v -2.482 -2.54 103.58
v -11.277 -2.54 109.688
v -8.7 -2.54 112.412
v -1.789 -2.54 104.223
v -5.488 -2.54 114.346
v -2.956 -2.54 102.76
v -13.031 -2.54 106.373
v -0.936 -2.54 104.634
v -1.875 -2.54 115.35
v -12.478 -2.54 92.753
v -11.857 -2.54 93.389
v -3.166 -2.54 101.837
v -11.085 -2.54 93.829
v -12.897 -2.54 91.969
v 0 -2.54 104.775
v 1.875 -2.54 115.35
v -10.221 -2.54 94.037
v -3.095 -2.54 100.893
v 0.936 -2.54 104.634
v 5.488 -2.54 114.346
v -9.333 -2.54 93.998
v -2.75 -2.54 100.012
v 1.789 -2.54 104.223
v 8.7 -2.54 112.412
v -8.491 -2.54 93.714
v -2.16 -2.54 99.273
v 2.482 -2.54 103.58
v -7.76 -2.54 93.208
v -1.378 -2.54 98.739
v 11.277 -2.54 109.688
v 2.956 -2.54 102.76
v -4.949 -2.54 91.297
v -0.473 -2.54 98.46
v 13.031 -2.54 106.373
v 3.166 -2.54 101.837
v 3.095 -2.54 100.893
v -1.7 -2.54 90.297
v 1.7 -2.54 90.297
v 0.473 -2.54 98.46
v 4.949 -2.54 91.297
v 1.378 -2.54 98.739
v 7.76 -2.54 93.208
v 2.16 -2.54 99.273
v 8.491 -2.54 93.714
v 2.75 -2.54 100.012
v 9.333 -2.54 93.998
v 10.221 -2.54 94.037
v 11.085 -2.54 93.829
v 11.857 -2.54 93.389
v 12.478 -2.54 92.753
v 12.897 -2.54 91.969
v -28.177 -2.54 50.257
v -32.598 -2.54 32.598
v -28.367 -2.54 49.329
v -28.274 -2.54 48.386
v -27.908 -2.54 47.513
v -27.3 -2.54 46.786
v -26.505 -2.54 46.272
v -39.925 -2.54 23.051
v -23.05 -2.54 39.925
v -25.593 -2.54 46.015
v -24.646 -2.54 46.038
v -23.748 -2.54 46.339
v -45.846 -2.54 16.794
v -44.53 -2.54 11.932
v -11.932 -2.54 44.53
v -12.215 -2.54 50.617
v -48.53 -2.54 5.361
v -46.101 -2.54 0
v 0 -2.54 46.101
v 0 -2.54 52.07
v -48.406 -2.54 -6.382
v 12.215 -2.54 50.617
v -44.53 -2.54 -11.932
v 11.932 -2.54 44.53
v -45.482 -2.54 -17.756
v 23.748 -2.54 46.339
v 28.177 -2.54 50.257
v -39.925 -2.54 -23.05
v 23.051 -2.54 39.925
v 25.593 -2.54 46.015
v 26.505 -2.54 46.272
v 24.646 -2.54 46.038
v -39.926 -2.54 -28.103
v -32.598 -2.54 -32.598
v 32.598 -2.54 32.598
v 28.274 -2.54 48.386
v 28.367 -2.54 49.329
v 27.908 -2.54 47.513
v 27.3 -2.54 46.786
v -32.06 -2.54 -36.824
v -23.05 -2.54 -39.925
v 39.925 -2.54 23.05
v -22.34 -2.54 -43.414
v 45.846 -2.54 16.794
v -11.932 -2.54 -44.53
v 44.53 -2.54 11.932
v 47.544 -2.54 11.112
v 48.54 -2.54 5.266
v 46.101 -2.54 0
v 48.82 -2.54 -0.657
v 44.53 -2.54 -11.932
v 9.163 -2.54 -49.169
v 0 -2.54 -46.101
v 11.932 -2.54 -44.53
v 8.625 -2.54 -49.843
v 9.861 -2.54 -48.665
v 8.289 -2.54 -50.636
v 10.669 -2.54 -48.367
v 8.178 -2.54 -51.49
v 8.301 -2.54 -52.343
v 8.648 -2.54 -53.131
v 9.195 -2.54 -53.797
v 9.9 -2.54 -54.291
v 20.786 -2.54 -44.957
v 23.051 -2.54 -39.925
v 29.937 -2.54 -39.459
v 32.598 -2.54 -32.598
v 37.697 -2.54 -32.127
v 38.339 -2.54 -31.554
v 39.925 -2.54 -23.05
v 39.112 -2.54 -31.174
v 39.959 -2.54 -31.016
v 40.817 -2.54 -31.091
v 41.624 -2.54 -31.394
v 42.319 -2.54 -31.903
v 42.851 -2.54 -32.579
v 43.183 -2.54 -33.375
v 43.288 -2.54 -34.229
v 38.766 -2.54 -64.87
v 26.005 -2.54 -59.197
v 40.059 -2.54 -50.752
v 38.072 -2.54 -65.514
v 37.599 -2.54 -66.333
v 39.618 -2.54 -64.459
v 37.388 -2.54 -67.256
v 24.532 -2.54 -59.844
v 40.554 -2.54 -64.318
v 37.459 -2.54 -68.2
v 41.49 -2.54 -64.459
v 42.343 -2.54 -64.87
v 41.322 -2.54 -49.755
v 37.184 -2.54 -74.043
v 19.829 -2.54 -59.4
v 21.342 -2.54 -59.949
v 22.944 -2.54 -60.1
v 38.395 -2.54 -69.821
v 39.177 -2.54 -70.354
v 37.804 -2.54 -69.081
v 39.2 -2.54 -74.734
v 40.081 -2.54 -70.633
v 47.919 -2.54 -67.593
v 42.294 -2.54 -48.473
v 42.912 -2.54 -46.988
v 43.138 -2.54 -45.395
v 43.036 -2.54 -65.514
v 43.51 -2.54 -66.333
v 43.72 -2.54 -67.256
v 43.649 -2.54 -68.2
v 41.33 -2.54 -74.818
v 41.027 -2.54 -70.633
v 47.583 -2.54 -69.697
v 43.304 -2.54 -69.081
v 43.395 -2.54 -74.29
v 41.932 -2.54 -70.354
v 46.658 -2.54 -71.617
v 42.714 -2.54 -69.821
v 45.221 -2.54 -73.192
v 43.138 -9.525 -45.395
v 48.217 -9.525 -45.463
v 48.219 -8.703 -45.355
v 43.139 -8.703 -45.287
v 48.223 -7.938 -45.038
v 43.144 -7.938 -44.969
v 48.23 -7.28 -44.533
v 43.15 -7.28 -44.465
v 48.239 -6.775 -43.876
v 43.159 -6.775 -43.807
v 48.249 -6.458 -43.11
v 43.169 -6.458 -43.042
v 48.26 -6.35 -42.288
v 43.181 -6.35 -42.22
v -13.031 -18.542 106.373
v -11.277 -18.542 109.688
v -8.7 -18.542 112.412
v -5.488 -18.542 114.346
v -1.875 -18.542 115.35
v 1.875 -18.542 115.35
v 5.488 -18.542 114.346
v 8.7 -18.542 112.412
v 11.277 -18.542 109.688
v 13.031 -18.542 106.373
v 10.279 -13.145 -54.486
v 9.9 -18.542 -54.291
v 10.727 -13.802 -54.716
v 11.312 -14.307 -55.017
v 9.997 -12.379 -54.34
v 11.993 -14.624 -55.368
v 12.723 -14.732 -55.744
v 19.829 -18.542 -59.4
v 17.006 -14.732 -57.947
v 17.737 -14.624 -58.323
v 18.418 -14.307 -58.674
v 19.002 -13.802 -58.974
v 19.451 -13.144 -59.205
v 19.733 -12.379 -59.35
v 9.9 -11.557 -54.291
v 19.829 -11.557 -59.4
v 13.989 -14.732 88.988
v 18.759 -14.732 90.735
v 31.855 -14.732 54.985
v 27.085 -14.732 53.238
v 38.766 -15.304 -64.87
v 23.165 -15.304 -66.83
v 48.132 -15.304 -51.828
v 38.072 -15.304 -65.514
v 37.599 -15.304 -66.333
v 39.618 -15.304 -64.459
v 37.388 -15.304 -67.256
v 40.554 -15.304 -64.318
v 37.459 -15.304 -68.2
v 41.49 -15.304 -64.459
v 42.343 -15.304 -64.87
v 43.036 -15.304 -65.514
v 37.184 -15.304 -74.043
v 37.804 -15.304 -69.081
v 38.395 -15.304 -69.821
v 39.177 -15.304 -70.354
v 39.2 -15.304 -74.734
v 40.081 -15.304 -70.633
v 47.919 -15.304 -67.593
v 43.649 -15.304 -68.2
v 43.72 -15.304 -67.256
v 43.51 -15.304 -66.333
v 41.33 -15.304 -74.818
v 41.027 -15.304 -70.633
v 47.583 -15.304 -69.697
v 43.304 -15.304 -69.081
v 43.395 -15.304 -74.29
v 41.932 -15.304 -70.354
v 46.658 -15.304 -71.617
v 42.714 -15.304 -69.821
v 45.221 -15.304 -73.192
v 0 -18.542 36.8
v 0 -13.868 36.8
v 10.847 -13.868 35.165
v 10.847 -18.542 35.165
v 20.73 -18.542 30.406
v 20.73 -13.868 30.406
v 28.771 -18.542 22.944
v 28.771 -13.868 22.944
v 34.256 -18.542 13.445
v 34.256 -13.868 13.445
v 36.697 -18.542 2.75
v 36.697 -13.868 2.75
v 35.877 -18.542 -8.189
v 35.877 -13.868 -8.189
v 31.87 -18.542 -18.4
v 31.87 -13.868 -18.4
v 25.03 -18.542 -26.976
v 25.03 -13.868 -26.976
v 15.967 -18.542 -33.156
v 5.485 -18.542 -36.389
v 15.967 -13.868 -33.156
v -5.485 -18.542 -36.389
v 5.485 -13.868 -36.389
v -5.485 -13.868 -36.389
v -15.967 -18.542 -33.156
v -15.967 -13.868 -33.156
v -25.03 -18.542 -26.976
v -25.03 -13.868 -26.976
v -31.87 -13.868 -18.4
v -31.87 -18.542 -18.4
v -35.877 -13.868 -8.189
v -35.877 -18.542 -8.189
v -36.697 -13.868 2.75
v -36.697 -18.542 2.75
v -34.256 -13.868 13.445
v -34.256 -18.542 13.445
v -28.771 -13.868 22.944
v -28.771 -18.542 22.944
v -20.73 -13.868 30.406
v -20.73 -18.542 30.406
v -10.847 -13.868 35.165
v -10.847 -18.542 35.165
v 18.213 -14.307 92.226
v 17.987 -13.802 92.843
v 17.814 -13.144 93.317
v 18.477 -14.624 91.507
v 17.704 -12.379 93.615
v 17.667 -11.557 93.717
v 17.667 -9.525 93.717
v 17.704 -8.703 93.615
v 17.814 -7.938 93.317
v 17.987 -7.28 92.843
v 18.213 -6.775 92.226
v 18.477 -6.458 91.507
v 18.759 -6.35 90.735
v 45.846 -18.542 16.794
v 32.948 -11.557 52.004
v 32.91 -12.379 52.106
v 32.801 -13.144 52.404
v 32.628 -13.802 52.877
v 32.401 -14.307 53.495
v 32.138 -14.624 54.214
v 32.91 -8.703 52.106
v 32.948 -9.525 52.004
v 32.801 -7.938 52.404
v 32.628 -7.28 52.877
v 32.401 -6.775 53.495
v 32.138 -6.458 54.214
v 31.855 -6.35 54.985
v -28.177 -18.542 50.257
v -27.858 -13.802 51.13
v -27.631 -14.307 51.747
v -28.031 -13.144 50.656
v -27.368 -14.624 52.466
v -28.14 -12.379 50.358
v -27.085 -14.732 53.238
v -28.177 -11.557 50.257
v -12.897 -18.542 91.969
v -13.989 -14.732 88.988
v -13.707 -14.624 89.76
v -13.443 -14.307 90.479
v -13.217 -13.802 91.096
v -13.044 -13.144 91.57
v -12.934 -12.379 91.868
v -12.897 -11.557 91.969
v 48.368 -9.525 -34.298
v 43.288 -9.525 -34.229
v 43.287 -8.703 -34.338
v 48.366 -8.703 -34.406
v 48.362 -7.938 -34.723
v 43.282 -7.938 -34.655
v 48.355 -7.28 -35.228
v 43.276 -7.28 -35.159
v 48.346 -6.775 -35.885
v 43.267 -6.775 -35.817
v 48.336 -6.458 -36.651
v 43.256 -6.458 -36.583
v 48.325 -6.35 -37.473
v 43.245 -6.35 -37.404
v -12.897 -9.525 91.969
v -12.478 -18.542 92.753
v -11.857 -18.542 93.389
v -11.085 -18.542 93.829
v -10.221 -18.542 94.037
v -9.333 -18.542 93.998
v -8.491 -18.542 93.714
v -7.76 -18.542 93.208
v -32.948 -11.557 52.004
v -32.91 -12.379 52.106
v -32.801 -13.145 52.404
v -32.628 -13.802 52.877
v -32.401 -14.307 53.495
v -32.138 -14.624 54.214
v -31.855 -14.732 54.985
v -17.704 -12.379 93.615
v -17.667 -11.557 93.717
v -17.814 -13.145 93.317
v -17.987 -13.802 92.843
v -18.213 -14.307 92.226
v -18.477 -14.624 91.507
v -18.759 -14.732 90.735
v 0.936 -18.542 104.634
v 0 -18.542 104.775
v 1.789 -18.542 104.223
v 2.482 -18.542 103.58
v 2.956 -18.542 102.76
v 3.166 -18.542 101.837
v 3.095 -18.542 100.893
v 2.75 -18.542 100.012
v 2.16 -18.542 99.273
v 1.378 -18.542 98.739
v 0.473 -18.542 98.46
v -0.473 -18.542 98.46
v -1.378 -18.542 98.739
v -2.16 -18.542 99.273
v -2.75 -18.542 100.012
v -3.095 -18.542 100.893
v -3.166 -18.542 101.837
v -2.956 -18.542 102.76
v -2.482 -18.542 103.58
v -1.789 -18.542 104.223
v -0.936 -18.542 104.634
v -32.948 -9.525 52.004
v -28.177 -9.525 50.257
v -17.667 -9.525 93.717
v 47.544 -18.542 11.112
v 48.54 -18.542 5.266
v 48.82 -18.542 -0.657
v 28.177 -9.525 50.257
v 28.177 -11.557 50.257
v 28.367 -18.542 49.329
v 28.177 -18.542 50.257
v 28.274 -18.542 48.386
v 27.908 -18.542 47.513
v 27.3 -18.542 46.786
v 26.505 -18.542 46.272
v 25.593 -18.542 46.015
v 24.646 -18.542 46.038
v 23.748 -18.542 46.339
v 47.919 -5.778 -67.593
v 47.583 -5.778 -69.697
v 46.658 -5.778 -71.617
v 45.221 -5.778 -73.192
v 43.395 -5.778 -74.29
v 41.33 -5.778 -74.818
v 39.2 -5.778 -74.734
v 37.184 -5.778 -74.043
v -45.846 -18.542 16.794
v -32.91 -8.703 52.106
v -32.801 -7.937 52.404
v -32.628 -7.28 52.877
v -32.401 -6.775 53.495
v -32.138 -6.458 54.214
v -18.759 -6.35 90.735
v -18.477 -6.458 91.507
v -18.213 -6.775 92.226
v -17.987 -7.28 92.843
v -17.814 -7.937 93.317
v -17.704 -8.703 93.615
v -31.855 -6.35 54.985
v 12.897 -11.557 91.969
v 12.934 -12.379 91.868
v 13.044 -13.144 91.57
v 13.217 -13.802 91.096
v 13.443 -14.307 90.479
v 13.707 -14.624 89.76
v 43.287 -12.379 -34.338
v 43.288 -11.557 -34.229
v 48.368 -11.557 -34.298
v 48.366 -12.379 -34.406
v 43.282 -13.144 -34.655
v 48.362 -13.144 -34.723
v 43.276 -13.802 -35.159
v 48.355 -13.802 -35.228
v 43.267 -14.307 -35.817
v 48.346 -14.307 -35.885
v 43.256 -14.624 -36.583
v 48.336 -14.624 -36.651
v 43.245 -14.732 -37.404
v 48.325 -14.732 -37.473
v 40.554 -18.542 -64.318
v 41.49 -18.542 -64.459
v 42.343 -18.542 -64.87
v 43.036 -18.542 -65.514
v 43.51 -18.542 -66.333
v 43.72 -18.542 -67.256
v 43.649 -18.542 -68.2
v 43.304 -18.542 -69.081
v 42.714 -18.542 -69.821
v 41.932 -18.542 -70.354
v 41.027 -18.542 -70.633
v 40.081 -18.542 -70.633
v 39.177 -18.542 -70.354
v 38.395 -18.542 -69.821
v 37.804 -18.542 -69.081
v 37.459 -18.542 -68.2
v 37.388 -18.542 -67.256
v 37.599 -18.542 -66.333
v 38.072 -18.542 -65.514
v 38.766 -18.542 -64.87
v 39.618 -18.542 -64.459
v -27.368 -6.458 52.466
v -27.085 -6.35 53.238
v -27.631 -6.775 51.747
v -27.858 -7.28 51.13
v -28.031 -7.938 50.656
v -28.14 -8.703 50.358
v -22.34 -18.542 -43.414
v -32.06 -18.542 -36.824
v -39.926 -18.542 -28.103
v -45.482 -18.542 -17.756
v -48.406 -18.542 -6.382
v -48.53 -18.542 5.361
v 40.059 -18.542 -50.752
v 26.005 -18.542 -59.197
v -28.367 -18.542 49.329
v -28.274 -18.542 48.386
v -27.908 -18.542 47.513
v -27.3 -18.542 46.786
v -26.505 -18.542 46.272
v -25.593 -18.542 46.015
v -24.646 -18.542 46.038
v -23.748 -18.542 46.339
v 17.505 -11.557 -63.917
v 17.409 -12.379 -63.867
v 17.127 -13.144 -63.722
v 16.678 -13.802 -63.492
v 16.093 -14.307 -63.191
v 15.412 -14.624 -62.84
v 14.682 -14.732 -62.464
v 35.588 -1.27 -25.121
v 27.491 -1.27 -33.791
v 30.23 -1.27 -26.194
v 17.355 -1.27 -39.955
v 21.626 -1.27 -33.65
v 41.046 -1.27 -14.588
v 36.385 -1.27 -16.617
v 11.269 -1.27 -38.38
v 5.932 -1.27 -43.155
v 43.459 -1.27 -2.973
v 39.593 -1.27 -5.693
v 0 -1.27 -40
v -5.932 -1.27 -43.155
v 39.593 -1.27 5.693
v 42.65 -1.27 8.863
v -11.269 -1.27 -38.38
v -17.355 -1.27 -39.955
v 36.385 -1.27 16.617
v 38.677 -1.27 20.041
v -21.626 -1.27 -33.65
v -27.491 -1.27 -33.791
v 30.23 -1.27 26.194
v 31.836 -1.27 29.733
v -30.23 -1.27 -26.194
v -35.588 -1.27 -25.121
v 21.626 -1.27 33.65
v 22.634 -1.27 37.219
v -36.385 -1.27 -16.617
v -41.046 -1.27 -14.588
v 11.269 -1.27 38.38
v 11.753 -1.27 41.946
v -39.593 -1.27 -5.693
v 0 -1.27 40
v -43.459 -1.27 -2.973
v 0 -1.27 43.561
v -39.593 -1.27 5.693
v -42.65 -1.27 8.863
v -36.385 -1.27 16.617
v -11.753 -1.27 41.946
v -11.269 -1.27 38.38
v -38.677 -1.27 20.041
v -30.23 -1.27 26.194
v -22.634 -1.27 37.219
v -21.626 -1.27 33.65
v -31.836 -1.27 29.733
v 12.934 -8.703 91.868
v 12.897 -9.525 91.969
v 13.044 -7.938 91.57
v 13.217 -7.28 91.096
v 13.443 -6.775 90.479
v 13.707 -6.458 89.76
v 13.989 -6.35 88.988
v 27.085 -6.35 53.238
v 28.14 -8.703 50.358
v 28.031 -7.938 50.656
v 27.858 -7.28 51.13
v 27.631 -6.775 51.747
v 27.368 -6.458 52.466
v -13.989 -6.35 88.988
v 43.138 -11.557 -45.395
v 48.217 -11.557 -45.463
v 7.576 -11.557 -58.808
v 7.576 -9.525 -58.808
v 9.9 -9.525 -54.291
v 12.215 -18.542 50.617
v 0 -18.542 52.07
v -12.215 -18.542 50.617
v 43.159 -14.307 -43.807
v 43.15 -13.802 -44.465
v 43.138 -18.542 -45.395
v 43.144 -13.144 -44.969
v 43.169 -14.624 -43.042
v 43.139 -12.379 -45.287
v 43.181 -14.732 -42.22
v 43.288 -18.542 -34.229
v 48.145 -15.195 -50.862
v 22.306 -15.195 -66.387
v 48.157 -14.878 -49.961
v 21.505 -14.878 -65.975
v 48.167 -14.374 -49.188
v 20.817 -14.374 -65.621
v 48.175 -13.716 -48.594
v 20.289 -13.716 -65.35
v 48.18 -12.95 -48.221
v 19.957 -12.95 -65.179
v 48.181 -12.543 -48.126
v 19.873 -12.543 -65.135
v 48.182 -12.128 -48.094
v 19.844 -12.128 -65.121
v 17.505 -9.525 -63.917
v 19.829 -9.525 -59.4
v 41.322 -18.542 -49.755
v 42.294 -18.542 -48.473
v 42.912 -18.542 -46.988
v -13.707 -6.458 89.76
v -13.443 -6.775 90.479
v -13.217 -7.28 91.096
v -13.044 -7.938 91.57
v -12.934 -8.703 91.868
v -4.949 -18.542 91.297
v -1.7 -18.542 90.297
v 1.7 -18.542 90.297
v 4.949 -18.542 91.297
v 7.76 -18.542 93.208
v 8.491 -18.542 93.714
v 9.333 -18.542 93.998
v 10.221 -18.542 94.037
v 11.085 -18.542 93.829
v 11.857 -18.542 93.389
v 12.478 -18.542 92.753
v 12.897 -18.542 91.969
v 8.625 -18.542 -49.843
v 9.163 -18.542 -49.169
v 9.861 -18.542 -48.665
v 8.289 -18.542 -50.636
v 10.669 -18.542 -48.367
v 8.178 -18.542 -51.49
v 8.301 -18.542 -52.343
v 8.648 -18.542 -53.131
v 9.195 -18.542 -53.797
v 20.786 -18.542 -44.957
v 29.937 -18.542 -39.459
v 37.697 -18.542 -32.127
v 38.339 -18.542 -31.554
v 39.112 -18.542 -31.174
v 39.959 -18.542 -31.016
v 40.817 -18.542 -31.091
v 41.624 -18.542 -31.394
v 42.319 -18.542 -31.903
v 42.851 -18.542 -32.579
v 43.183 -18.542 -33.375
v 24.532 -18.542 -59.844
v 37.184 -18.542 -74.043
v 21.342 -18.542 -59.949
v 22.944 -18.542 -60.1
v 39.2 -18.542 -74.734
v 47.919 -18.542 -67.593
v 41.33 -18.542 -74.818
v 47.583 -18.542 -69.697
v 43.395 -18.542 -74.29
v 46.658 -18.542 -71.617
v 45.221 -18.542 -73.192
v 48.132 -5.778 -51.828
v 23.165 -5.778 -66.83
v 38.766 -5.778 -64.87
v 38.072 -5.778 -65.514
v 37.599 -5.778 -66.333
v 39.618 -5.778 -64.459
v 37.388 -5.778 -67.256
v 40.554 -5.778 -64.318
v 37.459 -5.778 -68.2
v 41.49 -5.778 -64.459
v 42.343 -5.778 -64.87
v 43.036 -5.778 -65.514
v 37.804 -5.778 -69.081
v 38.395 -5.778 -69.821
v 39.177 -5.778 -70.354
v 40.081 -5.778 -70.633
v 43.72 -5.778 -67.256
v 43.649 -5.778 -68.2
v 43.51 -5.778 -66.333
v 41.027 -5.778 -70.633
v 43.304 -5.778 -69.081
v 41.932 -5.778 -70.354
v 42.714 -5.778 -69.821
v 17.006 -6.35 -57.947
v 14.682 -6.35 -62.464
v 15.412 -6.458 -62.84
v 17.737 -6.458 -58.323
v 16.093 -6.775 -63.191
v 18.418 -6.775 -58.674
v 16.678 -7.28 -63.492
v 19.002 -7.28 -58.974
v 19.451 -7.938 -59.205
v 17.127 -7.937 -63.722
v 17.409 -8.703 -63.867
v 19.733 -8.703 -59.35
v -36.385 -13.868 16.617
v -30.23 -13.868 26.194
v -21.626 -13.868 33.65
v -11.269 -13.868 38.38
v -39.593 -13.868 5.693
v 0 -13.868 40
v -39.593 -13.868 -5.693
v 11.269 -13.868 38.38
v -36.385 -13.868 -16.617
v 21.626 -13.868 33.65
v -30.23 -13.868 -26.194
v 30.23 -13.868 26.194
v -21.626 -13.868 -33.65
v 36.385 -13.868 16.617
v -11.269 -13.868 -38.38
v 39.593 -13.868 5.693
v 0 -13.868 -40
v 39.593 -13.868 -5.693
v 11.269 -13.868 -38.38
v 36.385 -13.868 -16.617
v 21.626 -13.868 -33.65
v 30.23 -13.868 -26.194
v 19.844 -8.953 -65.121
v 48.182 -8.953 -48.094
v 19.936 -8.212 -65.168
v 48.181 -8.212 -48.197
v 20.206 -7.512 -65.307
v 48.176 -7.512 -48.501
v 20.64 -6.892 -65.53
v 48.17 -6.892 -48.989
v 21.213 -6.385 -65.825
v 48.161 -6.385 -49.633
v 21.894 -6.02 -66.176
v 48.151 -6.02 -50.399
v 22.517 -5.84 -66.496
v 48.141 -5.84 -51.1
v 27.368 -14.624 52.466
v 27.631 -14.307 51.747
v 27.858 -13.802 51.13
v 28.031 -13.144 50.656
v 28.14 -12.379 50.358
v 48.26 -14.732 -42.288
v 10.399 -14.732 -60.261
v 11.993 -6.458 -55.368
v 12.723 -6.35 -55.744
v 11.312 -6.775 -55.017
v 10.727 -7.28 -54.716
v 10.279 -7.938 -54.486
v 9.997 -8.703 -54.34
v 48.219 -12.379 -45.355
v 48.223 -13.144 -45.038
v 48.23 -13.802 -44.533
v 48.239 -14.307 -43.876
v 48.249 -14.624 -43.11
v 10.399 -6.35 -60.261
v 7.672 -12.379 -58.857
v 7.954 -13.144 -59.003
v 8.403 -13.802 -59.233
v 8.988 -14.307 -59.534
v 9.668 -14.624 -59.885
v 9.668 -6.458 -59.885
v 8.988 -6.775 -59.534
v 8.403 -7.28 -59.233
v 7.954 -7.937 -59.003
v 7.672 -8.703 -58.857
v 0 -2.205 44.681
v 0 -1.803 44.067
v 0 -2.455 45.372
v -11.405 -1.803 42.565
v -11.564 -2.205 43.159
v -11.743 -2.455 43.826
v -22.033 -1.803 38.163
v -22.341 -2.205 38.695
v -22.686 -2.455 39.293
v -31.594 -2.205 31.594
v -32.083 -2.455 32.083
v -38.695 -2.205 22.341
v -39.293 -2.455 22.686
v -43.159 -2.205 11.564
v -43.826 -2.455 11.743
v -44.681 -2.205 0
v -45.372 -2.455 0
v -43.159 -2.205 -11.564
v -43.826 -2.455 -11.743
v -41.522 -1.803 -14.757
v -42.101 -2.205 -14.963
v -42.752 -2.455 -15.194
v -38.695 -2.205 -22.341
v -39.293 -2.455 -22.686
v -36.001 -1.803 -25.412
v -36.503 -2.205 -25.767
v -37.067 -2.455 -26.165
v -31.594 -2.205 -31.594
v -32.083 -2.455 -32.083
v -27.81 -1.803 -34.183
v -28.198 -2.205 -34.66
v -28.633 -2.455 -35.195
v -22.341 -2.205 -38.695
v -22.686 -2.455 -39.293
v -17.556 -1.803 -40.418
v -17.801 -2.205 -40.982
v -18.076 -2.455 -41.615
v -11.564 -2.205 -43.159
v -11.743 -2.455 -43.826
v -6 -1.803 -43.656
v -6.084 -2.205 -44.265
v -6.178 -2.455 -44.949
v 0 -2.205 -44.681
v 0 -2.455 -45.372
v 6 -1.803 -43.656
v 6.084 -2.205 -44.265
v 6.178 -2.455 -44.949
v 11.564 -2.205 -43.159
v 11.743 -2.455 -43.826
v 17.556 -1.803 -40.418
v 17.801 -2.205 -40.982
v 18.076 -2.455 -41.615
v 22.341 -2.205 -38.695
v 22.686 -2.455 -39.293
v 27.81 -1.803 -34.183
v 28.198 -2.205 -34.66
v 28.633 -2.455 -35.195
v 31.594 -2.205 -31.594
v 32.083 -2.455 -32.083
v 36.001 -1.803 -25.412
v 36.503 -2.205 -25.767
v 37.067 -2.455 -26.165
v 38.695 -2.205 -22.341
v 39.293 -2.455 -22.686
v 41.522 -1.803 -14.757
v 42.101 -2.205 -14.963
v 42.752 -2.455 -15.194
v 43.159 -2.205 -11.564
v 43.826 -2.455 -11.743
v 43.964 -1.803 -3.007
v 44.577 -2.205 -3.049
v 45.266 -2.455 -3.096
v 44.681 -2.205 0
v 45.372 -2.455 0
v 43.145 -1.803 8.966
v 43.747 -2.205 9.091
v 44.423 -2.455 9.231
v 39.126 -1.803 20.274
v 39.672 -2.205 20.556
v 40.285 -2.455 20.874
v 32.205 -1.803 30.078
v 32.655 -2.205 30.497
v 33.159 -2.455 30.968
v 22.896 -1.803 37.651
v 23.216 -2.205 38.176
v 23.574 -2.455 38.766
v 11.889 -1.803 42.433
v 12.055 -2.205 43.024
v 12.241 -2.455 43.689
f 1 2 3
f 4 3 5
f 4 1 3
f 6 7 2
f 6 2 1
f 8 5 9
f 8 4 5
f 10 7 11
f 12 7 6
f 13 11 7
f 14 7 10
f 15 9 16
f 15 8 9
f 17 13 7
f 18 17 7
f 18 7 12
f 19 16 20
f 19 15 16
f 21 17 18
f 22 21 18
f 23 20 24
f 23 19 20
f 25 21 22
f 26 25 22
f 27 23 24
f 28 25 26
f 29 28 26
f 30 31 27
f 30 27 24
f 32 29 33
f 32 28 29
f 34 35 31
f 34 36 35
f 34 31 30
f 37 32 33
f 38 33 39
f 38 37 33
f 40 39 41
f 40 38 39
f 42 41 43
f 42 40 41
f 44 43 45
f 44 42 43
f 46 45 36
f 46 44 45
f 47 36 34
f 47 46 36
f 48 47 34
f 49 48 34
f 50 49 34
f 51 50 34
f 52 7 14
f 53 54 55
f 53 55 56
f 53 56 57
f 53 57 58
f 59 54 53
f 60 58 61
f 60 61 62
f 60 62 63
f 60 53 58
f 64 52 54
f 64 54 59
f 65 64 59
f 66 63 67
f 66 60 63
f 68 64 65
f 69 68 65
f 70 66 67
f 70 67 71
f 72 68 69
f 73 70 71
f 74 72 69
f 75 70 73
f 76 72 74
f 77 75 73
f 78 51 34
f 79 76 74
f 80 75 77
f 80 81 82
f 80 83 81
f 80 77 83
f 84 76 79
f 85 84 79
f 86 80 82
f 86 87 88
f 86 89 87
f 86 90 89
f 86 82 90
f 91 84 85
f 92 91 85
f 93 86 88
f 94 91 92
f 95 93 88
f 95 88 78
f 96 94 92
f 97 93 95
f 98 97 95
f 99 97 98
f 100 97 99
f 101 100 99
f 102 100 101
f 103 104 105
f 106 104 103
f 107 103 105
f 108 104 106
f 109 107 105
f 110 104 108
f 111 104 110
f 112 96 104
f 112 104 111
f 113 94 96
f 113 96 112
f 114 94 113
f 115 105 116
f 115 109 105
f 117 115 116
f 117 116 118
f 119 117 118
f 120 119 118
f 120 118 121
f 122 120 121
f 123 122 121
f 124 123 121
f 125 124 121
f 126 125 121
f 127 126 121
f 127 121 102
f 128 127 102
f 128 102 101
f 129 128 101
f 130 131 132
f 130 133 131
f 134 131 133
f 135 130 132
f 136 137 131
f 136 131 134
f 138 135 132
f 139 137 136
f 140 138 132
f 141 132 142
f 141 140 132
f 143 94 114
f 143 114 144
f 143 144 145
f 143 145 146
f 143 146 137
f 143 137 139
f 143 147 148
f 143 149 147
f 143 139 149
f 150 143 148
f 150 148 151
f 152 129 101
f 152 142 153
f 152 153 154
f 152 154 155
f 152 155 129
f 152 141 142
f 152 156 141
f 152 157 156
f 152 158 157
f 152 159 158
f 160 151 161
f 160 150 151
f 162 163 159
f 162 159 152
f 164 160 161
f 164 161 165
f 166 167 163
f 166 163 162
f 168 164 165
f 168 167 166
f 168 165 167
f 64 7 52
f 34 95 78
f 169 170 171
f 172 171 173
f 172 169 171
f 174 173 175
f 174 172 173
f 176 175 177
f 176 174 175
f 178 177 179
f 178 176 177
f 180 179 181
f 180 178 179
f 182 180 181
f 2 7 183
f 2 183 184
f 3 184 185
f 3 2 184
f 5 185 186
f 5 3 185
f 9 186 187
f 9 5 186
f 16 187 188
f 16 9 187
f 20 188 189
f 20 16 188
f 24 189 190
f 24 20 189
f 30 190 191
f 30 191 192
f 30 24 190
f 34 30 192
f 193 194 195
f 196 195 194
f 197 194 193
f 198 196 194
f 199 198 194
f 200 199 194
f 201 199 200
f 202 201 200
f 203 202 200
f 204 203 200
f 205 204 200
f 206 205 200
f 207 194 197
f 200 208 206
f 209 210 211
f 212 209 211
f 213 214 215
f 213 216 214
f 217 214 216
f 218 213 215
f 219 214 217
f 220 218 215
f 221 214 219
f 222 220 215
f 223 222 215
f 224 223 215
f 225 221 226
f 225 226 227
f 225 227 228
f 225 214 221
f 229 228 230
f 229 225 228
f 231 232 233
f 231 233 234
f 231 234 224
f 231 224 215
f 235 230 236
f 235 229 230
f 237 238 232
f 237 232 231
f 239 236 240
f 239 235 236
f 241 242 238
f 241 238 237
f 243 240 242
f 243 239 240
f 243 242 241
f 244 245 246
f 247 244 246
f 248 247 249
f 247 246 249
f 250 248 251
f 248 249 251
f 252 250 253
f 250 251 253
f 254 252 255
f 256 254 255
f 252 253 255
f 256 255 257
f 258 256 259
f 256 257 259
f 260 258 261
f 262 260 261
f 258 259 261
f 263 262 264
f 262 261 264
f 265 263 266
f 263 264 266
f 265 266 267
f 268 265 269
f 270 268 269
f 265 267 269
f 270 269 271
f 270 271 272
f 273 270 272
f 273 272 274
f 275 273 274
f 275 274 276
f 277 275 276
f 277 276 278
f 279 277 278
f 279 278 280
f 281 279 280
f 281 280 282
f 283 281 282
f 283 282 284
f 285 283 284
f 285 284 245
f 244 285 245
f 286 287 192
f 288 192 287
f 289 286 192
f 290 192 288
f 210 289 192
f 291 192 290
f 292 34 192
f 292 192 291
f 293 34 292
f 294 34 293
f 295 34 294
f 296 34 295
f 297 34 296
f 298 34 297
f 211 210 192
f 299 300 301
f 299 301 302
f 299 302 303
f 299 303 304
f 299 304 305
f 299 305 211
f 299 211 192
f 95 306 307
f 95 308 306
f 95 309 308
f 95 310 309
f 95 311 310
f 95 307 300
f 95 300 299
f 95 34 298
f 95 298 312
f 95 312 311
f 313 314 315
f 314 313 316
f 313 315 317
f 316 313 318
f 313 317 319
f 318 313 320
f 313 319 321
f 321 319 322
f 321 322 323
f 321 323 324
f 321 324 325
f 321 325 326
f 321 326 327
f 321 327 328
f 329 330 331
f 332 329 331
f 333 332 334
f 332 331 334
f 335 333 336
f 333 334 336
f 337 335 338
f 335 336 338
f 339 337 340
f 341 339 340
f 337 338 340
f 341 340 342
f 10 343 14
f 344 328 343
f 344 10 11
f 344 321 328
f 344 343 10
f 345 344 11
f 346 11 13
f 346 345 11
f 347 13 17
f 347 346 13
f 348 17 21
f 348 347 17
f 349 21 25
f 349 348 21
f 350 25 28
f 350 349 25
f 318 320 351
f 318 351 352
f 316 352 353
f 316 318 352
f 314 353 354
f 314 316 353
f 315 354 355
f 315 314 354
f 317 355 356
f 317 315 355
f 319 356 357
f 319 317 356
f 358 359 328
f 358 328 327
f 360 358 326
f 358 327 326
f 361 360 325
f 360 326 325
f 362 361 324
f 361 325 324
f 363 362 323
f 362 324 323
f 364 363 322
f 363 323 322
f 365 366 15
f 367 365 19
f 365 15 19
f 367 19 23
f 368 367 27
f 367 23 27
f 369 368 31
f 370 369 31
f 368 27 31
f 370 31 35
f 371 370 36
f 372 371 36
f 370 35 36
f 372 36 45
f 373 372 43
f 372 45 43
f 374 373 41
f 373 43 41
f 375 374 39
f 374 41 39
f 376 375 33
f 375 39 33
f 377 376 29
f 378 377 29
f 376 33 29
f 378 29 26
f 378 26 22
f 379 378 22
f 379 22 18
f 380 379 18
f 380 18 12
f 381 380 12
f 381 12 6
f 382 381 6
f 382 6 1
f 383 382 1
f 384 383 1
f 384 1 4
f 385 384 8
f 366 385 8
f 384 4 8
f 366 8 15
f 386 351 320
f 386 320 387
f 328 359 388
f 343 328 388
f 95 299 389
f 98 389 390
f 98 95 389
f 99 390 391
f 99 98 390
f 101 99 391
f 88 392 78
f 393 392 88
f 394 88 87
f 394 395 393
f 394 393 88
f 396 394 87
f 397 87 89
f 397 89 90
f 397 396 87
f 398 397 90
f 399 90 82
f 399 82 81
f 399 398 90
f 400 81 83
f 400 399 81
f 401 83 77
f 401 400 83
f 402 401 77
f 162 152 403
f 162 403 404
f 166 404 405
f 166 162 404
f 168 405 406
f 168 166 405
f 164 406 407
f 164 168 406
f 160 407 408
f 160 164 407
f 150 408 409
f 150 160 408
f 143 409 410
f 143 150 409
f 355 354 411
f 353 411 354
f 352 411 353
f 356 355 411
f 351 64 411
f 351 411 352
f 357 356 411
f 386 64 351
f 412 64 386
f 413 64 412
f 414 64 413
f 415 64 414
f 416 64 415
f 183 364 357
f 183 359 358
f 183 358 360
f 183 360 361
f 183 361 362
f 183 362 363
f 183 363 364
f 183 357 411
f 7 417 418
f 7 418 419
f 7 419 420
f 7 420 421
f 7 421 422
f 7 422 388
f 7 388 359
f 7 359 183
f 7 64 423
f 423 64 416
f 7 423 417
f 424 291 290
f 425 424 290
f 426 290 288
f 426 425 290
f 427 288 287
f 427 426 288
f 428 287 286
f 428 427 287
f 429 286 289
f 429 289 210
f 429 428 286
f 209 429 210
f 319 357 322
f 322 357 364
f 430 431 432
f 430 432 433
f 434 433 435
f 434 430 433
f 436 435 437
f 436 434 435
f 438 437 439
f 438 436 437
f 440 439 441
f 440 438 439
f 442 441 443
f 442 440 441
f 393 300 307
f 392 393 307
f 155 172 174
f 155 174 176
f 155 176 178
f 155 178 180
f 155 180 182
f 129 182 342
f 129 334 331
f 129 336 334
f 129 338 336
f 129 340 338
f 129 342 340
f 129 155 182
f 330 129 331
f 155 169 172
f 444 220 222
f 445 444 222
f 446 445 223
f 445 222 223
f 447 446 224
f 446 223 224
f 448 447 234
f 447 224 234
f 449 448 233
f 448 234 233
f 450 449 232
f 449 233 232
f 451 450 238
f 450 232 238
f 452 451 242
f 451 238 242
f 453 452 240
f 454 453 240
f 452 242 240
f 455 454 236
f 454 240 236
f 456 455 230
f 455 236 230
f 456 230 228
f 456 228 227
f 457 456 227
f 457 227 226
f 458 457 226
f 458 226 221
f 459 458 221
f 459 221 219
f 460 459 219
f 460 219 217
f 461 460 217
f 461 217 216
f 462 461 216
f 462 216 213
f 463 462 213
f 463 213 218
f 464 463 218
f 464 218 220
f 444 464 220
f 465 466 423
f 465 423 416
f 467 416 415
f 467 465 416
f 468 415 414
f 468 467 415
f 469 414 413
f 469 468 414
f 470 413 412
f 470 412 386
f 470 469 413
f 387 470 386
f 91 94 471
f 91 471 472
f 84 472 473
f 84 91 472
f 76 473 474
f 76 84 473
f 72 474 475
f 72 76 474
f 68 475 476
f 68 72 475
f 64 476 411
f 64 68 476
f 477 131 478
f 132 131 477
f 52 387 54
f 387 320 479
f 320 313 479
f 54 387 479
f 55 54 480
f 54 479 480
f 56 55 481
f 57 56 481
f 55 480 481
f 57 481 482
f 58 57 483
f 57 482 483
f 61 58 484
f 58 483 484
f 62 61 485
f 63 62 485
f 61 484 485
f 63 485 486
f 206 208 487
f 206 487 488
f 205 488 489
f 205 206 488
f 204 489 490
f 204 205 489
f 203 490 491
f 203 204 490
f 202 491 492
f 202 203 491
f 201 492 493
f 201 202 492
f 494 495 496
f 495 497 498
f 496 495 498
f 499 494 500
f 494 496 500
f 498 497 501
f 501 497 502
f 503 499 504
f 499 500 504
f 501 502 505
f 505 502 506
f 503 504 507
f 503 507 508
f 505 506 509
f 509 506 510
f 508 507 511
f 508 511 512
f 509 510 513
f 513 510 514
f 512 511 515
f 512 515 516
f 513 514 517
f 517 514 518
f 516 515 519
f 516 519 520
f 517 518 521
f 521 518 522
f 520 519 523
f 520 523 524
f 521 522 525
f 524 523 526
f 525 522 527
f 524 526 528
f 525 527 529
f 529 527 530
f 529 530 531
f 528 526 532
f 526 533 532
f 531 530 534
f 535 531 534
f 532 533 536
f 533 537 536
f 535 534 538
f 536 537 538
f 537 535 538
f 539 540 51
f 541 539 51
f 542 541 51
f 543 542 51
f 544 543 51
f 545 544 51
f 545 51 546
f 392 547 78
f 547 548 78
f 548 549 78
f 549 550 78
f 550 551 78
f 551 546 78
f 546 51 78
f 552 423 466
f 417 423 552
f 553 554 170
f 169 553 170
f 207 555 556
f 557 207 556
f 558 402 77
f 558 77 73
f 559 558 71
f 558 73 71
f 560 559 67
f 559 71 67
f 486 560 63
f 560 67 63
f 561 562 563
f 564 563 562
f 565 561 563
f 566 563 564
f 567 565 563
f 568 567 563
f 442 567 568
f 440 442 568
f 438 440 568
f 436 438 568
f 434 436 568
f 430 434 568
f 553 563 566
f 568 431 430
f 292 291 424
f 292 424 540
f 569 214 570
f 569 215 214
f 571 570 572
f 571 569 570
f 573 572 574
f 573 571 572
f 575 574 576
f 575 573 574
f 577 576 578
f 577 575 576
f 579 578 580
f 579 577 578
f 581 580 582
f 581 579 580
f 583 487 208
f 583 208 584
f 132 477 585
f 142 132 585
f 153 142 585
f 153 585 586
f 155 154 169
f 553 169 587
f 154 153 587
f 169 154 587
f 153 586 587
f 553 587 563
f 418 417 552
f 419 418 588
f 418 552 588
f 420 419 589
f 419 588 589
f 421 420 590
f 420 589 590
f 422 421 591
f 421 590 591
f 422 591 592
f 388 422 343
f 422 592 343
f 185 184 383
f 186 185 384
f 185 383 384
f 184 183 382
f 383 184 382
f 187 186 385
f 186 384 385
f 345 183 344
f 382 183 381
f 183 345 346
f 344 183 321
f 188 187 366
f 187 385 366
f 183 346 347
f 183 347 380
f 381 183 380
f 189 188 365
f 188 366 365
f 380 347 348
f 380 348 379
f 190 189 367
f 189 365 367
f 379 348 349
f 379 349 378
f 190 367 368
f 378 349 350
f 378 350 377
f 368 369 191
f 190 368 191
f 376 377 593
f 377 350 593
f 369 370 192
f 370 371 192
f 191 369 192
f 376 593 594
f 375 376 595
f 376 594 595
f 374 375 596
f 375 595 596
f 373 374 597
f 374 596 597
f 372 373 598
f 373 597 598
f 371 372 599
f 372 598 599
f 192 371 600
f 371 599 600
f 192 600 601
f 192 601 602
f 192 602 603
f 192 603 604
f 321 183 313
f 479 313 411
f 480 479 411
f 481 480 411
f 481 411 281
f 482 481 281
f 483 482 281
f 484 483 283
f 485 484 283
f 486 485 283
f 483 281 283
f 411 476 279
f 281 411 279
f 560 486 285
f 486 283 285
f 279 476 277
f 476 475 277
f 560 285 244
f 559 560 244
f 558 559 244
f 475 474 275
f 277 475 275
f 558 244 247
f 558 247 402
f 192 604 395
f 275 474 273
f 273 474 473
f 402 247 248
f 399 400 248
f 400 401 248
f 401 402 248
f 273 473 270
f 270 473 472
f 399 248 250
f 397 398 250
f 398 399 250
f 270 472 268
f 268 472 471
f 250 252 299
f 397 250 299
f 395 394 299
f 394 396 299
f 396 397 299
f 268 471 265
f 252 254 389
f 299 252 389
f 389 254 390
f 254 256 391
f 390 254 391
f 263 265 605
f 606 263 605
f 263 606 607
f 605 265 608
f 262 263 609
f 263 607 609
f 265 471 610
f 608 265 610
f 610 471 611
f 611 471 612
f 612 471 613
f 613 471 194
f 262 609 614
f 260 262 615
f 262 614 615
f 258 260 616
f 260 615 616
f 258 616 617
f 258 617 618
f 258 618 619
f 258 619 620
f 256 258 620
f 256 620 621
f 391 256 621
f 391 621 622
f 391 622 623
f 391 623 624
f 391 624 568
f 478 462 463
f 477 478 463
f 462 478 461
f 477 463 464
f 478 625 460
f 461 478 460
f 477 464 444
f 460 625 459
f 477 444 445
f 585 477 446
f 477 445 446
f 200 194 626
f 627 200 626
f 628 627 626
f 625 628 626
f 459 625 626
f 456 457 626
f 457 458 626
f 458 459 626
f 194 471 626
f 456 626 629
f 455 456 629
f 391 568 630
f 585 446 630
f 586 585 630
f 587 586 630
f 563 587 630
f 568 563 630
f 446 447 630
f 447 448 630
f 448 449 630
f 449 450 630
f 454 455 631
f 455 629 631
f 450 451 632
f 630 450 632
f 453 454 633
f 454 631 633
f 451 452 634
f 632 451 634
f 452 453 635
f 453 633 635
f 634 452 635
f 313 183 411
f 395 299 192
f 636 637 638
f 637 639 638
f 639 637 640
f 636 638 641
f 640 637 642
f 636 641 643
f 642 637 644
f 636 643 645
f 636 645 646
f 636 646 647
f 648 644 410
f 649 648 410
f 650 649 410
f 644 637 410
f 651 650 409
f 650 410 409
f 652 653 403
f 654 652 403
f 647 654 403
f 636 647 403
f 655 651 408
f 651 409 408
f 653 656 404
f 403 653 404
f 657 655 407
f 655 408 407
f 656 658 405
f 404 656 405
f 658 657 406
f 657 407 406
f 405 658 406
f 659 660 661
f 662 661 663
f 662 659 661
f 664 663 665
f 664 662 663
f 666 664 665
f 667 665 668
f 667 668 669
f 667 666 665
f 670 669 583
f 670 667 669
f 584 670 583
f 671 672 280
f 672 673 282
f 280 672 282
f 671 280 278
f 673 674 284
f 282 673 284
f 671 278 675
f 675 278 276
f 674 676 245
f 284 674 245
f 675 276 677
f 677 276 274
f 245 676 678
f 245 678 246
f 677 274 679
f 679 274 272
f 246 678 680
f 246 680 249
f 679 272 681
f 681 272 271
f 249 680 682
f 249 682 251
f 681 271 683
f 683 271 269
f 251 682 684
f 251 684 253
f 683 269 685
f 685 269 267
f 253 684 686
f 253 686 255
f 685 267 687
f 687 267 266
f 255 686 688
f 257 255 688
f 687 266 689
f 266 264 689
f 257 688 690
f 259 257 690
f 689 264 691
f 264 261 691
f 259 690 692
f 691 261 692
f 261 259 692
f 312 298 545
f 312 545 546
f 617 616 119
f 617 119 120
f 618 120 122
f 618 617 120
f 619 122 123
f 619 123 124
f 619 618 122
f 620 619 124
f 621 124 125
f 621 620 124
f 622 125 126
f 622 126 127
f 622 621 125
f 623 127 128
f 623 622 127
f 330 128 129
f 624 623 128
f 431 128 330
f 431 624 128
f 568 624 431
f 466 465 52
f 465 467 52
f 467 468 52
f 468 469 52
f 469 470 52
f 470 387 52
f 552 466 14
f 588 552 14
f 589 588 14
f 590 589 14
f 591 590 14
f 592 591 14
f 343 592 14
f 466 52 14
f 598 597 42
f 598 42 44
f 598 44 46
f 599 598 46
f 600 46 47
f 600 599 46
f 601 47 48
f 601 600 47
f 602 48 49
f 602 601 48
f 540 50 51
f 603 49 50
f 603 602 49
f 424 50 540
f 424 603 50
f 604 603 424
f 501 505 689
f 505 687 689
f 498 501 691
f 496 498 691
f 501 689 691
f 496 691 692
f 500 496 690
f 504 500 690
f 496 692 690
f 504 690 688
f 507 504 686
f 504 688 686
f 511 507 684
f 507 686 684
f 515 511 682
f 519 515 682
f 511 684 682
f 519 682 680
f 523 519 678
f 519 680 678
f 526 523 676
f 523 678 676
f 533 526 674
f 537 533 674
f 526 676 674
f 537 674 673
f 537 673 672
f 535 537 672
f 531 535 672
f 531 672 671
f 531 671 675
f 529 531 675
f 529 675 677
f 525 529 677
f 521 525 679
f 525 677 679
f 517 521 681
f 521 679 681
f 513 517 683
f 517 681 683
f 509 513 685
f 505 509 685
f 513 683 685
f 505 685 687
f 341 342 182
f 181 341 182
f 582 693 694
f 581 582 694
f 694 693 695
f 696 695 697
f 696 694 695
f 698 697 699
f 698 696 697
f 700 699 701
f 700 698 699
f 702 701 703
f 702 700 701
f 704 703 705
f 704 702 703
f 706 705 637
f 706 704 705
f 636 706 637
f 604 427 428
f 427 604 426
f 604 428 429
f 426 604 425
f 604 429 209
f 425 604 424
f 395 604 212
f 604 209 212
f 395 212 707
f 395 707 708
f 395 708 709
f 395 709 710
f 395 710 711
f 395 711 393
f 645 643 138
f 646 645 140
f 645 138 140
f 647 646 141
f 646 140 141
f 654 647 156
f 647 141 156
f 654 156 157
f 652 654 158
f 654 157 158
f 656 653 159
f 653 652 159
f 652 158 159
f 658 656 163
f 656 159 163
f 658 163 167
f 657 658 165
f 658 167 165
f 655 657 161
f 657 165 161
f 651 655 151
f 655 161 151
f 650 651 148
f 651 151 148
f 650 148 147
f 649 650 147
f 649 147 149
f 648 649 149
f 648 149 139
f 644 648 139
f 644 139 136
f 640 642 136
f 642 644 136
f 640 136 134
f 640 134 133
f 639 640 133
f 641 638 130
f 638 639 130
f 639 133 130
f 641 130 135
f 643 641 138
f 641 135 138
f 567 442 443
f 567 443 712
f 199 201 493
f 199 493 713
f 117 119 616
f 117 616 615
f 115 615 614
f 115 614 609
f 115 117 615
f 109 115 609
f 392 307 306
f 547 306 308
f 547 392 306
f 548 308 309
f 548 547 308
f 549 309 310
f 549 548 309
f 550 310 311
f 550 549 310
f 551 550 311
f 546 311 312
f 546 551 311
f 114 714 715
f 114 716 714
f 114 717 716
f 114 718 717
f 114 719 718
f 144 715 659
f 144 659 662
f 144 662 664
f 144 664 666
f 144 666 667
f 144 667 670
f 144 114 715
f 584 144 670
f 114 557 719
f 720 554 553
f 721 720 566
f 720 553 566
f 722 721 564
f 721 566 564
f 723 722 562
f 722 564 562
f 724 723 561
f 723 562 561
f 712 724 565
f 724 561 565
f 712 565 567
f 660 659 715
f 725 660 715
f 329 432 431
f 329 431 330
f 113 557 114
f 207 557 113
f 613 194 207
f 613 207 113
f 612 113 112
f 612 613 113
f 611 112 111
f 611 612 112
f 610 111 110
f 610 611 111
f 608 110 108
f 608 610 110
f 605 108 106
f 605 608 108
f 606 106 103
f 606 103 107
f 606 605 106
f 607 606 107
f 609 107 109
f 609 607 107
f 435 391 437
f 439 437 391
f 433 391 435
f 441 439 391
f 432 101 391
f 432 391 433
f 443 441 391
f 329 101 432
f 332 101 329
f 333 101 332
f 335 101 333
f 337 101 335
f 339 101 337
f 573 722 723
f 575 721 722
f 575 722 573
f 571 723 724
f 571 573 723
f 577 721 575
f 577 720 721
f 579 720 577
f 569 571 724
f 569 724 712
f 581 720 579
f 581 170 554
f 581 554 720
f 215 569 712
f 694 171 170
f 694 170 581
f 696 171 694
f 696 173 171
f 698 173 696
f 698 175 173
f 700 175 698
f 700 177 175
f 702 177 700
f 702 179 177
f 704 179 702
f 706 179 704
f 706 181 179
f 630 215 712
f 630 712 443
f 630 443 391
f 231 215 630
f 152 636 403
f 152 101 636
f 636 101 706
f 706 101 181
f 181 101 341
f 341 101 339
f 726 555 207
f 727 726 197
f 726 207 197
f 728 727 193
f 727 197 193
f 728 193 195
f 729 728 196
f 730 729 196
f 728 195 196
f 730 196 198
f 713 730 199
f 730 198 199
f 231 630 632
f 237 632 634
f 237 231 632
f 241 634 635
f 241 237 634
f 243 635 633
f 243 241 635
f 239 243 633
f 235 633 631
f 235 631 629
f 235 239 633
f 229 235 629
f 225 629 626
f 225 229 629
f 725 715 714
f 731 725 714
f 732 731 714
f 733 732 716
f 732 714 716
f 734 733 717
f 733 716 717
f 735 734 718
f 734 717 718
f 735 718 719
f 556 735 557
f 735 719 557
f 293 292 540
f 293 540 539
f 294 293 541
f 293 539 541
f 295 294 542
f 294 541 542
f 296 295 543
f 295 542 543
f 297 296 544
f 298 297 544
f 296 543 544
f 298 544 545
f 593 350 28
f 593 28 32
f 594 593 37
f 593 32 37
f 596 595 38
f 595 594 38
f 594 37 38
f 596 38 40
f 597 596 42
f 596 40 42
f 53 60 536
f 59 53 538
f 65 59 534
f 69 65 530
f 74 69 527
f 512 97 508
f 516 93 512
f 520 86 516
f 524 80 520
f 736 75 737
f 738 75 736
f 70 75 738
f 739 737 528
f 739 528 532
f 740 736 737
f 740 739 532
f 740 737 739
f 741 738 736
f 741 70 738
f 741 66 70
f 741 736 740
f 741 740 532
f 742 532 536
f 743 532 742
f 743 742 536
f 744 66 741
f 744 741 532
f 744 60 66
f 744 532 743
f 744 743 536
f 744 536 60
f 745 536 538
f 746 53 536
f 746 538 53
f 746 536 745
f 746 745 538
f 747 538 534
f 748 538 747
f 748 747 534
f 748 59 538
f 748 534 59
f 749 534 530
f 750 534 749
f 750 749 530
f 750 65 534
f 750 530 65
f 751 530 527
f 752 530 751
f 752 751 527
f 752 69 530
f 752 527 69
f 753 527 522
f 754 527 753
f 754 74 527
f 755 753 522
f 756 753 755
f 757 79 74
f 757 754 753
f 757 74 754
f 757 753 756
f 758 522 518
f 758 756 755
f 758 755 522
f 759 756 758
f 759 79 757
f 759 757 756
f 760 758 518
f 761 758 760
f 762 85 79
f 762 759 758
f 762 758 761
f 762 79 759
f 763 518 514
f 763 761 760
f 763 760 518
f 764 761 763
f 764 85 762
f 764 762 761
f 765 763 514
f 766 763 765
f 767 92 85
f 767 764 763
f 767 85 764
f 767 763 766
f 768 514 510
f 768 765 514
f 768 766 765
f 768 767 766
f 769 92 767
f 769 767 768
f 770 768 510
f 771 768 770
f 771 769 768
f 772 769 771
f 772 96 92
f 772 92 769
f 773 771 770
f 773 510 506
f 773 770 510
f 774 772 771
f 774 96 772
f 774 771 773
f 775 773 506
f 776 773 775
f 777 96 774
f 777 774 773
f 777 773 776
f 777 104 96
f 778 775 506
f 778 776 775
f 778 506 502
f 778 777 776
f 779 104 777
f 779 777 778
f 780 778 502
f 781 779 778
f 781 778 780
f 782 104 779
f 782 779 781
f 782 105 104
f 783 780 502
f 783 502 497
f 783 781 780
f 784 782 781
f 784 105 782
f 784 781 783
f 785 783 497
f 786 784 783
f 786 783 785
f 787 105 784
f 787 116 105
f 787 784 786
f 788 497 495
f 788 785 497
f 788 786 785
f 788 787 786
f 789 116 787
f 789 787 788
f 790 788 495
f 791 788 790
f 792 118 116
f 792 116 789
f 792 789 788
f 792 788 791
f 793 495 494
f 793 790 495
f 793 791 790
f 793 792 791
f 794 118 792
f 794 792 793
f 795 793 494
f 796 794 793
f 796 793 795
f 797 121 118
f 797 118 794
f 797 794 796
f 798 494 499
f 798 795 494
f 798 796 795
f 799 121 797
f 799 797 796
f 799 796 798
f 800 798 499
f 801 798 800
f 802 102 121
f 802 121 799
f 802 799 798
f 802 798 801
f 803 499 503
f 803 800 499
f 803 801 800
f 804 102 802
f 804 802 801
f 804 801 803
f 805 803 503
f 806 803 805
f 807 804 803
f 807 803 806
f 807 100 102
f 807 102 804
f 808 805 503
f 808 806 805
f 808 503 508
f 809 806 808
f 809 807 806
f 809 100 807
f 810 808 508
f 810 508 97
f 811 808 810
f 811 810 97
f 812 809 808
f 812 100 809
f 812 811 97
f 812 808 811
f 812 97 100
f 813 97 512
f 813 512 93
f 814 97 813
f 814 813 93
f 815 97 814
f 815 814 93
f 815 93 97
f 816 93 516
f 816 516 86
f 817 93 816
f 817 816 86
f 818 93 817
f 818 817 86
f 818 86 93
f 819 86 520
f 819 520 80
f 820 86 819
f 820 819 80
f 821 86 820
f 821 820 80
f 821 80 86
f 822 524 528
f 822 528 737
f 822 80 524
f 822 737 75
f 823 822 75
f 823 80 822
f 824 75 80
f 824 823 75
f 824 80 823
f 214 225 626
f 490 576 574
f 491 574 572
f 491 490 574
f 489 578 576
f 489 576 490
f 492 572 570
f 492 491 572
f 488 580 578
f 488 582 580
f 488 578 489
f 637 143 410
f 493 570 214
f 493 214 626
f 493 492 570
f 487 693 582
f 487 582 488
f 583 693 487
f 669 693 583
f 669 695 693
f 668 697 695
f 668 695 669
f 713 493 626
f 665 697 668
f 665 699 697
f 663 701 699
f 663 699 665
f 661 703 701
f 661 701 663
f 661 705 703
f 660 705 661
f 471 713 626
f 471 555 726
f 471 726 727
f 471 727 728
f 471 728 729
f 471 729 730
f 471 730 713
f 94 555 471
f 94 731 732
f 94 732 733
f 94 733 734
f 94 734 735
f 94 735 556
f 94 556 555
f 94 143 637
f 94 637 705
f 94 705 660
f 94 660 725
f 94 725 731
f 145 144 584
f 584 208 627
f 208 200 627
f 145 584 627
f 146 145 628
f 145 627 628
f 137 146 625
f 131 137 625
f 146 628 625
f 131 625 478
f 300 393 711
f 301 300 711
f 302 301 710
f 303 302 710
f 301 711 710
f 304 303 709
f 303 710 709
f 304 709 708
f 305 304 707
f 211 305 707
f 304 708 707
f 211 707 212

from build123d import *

# Parameters (mm, degrees)
SKETCH1_R           = 36.800037017
SKETCH1_R_2         = 3.175
BOSS_EXTRUDE1_DEPTH = 16.002
SKETCH5_R           = 43.561
SKETCH5_R_2         = 40.000036967
BOSS_EXTRUDE3_DEPTH = 1.27
SKETCH6_R           = 40.000036967
SKETCH6_R_2         = 36.800037017
CUT_EXTRUDE2_DEPTH  = 11.3284
FILLET2_R           = 3.175
CUT_EXTRUDE3_DEPTH  = 4.7625
CUT_EXTRUDE4_DEPTH  = 18.80616
FILLET3_R           = 3.175
FILLET5_R           = 6.35
CUT_EXTRUDE5_REACH  = 140.003
SKETCH22_W          = 44.42320982
SKETCH22_H          = 8.382
CUT_EXTRUDE6_REACH  = 140.003
SKETCH23_W          = 44.42320982
SKETCH23_H          = 8.382
CUT_EXTRUDE7_REACH  = 154.858
SKETCH24_W          = 11.166222722
SKETCH24_H          = 8.382
CUT_EXTRUDE8_REACH  = 177.085
SKETCH25_W          = 11.166222722
SKETCH25_H          = 8.382
FILLET6_R           = 3.175


with BuildPart() as part:
    # Sketch1 → Boss-Extrude1 (new body)
    with BuildSketch(Plane(origin=(0, 0, 0), x_dir=(1, 0, 0), z_dir=(0, 1, 0))):
        with BuildLine():
            Line((-45.845642474, -16.794270915), (-13.030803906, -106.373471135))
            ThreePointArc((-13.030803906, -106.373471135), (0, -115.477603436), (13.030803906, -106.373471135))
            Line((13.030803906, -106.373471135), (45.845642474, -16.794270915))
            ThreePointArc((45.845642474, -16.794270915), (48.13062155, -8.204495023), (48.820472847, 0.657191296))
            Line((48.820472847, 0.657191296), (47.919430717, 67.592500854))
            ThreePointArc((47.919430717, 67.592500854), (44.347868478, 73.807247594), (37.183825898, 74.043103011))
            Line((37.183825898, 74.043103011), (-22.33955821, 43.414451608))
            ThreePointArc((-22.33955821, 43.414451608), (-45.481622278, 17.756477815), (-45.845642474, -16.794270915))
        make_face()
        with Locations(Location((0, 0, 0), (0, 0, 270))):
            Circle(SKETCH1_R, mode=Mode.SUBTRACT)
        with Locations(Location((0, -101.6, 0), (0, 0, 270))):
            Circle(SKETCH1_R_2, mode=Mode.SUBTRACT)
        with Locations(Location((40.554098018, 67.493353257, 0), (0, 0, 270))):
            Circle(SKETCH1_R_2, mode=Mode.SUBTRACT)
    extrude(amount=BOSS_EXTRUDE1_DEPTH)

    # Sketch5 → Boss-Extrude3 (add)
    with BuildSketch(Plane.XZ):
        with Locations(Location((0, 0, 0), (0, 0, 90))):
            Circle(SKETCH5_R)
        with Locations(Location((0, 0, 0), (0, 0, 270))):
            Circle(SKETCH5_R_2, mode=Mode.SUBTRACT)
    extrude(amount=BOSS_EXTRUDE3_DEPTH)

    # Sketch6 → Cut-Extrude2 (cut)
    with BuildSketch(Plane.XZ):
        with Locations(Location((0, 0, 0), (0, 0, 270))):
            Circle(SKETCH6_R)
        with Locations(Location((0, 0, 0), (0, 0, 270))):
            Circle(SKETCH6_R_2, mode=Mode.SUBTRACT)
    extrude(amount=-CUT_EXTRUDE2_DEPTH, mode=Mode.SUBTRACT)

    # Fillet2
    # the kernel refuses this fillet: 3.175 mm, written as the material it adds along each edge
    with BuildSketch(Plane(origin=(0, 0, 0), x_dir=(0, 0, 1), z_dir=(1, 0, 0))) as fillet2_piece_1:
        with BuildLine():
            CenterArc((46.101, 3.175), FILLET2_R, 216.869897646, 53.130102354)
            Line((46.101, 0), (46.101, -0.0635))
            Line((46.101, -0.0635), (43.561, -0.0635))
            Line((43.561, -0.0635), (43.4975, 0))
            ThreePointArc((43.4975, 0), (43.4975, 0.635), (43.5102, 1.2319))
            Line((43.5102, 1.2319), (43.561, 1.27))
        make_face()
    revolve(axis=Axis((0, 0, 0), (0, -1, 0)))

    # Sketch7 → Cut-Extrude3 (cut, symmetric)
    with BuildSketch(Plane(origin=(0, 8.001, 0), x_dir=(-1, 0, 0), z_dir=(0, -1, 0))):
        Polygon((-8.642366299, 86.667856133), (-2.101382747, 75.781831414), (-66.916726186, 36.836844033), (-73.457709737, 47.722868752), (-97.309602446, 87.419084403), (-32.494259008, 126.364071784), align=None)
    extrude(amount=CUT_EXTRUDE3_DEPTH, both=True, mode=Mode.SUBTRACT)


with BuildPart() as body_2:
    # Mirror1: mirrored copy
    add(part.part.mirror(Plane(origin=(0, -1.27, 0), x_dir=(0, 0, 1), z_dir=(0, -1, 0))))

    # Sketch9 → Cut-Extrude4 (cut)
    with BuildSketch(Plane(origin=(0, 0, 0), x_dir=(1, 0, 0), z_dir=(0, 1, 0))):
        with BuildLine():
            Line((22.973751547, 61.018010354), (43.090182322, 48.930839307))
            Line((43.090182322, 48.930839307), (43.428261446, 23.816108157))
            ThreePointArc((43.428261446, 23.816108157), (25.50983585, 42.455496404), (0.640041598, 49.525864422))
            Line((0.640041598, 49.525864422), (22.973751547, 61.018010354))
        make_face()
        with BuildLine():
            Line((-31.360879833, -41.566574505), (-10.770746379, -97.774307586))
            ThreePointArc((-10.770746379, -97.774307586), (0, -90.17), (10.770746379, -97.774307586))
            Line((10.770746379, -97.774307586), (31.360879833, -41.566574505))
            ThreePointArc((31.360879833, -41.566574505), (0, -52.07), (-31.360879833, -41.566574505))
        make_face()
    extrude(amount=-CUT_EXTRUDE4_DEPTH, mode=Mode.SUBTRACT)

    # Fillet3
    fillet3_edges = [body_2.edges().sort_by_distance(p)[0] for p in [
        (0.640041598, -10.541, -49.525864422),
        (43.428261446, -10.541, -23.816108157),
        (-31.360879833, -10.541, 41.566574505),
        (31.360879833, -10.541, 41.566574505),
        (10.770746379, -10.541, 97.774307586),
        (-10.770746379, -10.541, 97.774307586),
        (34.013114467, -15.3035, -56.607328538),
        (34.013114467, -5.7785, -56.607328538),
    ]]
    fillet(fillet3_edges, radius=FILLET3_R)

    # Fillet5
    fillet5_edges = [body_2.edges().sort_by_distance(p)[0] for p in [
        (22.973751547, -10.541, -61.018010354),
        (43.090182322, -10.541, -48.930839307),
    ]]
    fillet(fillet5_edges, radius=FILLET5_R)

    # Sketch22 → Cut-Extrude5 (cut, up to next)
    with BuildSketch(Plane(origin=(45.845642474, 0, 16.794270915), x_dir=(0.34396941500000017, 0, -0.9389808525974094), z_dir=(0.9389808525974093, 0, 0.3439694150000001)), mode=Mode.PRIVATE) as cut_extrude5_sk1:
        with Locations((-59.709519033, -10.541)):
            Rectangle(SKETCH22_W, SKETCH22_H)
    cut_extrude5_tool1 = extrude(cut_extrude5_sk1.sketch, amount=-CUT_EXTRUDE5_REACH, mode=Mode.PRIVATE) & body_2.part
    add(cut_extrude5_tool1.solids().sort_by_distance((25.307394, -10.541, 72.860366))[0], mode=Mode.SUBTRACT)

    # Sketch23 → Cut-Extrude6 (cut, up to next)
    with BuildSketch(Plane(origin=(-45.845642474, 0, 16.794270915), x_dir=(0.3439694150000003, 0, 0.9389808525974093), z_dir=(-0.9389808525974094, 0, 0.34396941500000033)), mode=Mode.PRIVATE) as cut_extrude6_sk1:
        with Locations((59.709519033, -10.541)):
            Rectangle(SKETCH23_W, SKETCH23_H)
    cut_extrude6_tool1 = extrude(cut_extrude6_sk1.sketch, amount=-CUT_EXTRUDE6_REACH, mode=Mode.PRIVATE) & body_2.part
    add(cut_extrude6_tool1.solids().sort_by_distance((-25.307394, -10.541, 72.860366))[0], mode=Mode.SUBTRACT)

    # Sketch24 → Cut-Extrude7 (cut, up to next)
    with BuildSketch(Plane(origin=(48.820472847, 0, -0.657191296), x_dir=(-0.01346016787133038, 0, -0.9999094078369678), z_dir=(0.9999094078369678, 0, -0.01346016787133038)), mode=Mode.PRIVATE) as cut_extrude7_sk1:
        with Locations((39.22684129, -10.541)):
            Rectangle(SKETCH24_W, SKETCH24_H)
    cut_extrude7_tool1 = extrude(cut_extrude7_sk1.sketch, amount=-CUT_EXTRUDE7_REACH, mode=Mode.PRIVATE) & body_2.part
    add(cut_extrude7_tool1.solids().sort_by_distance((48.292473, -10.541, -39.880479))[0], mode=Mode.SUBTRACT)

    # Sketch25 → Cut-Extrude8 (cut, up to next)
    with BuildSketch(Plane(origin=(-22.33955821, 0, -43.414451608), x_dir=(-0.8891867707725541, 0, 0.4575444095200786), z_dir=(-0.4575444095200785, 0, -0.889186770772554)), mode=Mode.PRIVATE) as cut_extrude8_sk1:
        with Locations((-39.22684129, -10.541)):
            Rectangle(SKETCH25_W, SKETCH25_H)
    cut_extrude8_tool1 = extrude(cut_extrude8_sk1.sketch, amount=-CUT_EXTRUDE8_REACH, mode=Mode.PRIVATE) & body_2.part
    add(cut_extrude8_tool1.solids().sort_by_distance((12.54043, -10.541, -61.362474))[0], mode=Mode.SUBTRACT)

    # Fillet6
    fillet6_edges = [body_2.edges().sort_by_distance(p)[0] for p in [
        (15.28227003, -14.732, 92.842955406),
        (15.28227003, -6.35, 92.842955406),
        (30.562495524, -6.35, 51.130411974),
        (30.562495524, -14.732, 51.130411974),
        (-30.562495524, -14.732, 51.130411974),
        (-30.562495524, -6.35, 51.130411974),
        (-15.28227003, -6.35, 92.842955406),
        (-15.28227003, -14.732, 92.842955406),
        (45.827852698, -14.732, -34.263684541),
        (45.827852698, -6.35, -34.263684541),
        (45.677553466, -6.35, -45.428895691),
        (45.677553466, -14.732, -45.428895691),
        (18.667021686, -14.732, -61.658460536),
        (18.667021686, -6.35, -61.658460536),
        (8.738164162, -6.35, -56.549417754),
        (8.738164162, -14.732, -56.549417754),
    ]]
    fillet(fillet6_edges, radius=FILLET6_R)


solid = body_2.part
